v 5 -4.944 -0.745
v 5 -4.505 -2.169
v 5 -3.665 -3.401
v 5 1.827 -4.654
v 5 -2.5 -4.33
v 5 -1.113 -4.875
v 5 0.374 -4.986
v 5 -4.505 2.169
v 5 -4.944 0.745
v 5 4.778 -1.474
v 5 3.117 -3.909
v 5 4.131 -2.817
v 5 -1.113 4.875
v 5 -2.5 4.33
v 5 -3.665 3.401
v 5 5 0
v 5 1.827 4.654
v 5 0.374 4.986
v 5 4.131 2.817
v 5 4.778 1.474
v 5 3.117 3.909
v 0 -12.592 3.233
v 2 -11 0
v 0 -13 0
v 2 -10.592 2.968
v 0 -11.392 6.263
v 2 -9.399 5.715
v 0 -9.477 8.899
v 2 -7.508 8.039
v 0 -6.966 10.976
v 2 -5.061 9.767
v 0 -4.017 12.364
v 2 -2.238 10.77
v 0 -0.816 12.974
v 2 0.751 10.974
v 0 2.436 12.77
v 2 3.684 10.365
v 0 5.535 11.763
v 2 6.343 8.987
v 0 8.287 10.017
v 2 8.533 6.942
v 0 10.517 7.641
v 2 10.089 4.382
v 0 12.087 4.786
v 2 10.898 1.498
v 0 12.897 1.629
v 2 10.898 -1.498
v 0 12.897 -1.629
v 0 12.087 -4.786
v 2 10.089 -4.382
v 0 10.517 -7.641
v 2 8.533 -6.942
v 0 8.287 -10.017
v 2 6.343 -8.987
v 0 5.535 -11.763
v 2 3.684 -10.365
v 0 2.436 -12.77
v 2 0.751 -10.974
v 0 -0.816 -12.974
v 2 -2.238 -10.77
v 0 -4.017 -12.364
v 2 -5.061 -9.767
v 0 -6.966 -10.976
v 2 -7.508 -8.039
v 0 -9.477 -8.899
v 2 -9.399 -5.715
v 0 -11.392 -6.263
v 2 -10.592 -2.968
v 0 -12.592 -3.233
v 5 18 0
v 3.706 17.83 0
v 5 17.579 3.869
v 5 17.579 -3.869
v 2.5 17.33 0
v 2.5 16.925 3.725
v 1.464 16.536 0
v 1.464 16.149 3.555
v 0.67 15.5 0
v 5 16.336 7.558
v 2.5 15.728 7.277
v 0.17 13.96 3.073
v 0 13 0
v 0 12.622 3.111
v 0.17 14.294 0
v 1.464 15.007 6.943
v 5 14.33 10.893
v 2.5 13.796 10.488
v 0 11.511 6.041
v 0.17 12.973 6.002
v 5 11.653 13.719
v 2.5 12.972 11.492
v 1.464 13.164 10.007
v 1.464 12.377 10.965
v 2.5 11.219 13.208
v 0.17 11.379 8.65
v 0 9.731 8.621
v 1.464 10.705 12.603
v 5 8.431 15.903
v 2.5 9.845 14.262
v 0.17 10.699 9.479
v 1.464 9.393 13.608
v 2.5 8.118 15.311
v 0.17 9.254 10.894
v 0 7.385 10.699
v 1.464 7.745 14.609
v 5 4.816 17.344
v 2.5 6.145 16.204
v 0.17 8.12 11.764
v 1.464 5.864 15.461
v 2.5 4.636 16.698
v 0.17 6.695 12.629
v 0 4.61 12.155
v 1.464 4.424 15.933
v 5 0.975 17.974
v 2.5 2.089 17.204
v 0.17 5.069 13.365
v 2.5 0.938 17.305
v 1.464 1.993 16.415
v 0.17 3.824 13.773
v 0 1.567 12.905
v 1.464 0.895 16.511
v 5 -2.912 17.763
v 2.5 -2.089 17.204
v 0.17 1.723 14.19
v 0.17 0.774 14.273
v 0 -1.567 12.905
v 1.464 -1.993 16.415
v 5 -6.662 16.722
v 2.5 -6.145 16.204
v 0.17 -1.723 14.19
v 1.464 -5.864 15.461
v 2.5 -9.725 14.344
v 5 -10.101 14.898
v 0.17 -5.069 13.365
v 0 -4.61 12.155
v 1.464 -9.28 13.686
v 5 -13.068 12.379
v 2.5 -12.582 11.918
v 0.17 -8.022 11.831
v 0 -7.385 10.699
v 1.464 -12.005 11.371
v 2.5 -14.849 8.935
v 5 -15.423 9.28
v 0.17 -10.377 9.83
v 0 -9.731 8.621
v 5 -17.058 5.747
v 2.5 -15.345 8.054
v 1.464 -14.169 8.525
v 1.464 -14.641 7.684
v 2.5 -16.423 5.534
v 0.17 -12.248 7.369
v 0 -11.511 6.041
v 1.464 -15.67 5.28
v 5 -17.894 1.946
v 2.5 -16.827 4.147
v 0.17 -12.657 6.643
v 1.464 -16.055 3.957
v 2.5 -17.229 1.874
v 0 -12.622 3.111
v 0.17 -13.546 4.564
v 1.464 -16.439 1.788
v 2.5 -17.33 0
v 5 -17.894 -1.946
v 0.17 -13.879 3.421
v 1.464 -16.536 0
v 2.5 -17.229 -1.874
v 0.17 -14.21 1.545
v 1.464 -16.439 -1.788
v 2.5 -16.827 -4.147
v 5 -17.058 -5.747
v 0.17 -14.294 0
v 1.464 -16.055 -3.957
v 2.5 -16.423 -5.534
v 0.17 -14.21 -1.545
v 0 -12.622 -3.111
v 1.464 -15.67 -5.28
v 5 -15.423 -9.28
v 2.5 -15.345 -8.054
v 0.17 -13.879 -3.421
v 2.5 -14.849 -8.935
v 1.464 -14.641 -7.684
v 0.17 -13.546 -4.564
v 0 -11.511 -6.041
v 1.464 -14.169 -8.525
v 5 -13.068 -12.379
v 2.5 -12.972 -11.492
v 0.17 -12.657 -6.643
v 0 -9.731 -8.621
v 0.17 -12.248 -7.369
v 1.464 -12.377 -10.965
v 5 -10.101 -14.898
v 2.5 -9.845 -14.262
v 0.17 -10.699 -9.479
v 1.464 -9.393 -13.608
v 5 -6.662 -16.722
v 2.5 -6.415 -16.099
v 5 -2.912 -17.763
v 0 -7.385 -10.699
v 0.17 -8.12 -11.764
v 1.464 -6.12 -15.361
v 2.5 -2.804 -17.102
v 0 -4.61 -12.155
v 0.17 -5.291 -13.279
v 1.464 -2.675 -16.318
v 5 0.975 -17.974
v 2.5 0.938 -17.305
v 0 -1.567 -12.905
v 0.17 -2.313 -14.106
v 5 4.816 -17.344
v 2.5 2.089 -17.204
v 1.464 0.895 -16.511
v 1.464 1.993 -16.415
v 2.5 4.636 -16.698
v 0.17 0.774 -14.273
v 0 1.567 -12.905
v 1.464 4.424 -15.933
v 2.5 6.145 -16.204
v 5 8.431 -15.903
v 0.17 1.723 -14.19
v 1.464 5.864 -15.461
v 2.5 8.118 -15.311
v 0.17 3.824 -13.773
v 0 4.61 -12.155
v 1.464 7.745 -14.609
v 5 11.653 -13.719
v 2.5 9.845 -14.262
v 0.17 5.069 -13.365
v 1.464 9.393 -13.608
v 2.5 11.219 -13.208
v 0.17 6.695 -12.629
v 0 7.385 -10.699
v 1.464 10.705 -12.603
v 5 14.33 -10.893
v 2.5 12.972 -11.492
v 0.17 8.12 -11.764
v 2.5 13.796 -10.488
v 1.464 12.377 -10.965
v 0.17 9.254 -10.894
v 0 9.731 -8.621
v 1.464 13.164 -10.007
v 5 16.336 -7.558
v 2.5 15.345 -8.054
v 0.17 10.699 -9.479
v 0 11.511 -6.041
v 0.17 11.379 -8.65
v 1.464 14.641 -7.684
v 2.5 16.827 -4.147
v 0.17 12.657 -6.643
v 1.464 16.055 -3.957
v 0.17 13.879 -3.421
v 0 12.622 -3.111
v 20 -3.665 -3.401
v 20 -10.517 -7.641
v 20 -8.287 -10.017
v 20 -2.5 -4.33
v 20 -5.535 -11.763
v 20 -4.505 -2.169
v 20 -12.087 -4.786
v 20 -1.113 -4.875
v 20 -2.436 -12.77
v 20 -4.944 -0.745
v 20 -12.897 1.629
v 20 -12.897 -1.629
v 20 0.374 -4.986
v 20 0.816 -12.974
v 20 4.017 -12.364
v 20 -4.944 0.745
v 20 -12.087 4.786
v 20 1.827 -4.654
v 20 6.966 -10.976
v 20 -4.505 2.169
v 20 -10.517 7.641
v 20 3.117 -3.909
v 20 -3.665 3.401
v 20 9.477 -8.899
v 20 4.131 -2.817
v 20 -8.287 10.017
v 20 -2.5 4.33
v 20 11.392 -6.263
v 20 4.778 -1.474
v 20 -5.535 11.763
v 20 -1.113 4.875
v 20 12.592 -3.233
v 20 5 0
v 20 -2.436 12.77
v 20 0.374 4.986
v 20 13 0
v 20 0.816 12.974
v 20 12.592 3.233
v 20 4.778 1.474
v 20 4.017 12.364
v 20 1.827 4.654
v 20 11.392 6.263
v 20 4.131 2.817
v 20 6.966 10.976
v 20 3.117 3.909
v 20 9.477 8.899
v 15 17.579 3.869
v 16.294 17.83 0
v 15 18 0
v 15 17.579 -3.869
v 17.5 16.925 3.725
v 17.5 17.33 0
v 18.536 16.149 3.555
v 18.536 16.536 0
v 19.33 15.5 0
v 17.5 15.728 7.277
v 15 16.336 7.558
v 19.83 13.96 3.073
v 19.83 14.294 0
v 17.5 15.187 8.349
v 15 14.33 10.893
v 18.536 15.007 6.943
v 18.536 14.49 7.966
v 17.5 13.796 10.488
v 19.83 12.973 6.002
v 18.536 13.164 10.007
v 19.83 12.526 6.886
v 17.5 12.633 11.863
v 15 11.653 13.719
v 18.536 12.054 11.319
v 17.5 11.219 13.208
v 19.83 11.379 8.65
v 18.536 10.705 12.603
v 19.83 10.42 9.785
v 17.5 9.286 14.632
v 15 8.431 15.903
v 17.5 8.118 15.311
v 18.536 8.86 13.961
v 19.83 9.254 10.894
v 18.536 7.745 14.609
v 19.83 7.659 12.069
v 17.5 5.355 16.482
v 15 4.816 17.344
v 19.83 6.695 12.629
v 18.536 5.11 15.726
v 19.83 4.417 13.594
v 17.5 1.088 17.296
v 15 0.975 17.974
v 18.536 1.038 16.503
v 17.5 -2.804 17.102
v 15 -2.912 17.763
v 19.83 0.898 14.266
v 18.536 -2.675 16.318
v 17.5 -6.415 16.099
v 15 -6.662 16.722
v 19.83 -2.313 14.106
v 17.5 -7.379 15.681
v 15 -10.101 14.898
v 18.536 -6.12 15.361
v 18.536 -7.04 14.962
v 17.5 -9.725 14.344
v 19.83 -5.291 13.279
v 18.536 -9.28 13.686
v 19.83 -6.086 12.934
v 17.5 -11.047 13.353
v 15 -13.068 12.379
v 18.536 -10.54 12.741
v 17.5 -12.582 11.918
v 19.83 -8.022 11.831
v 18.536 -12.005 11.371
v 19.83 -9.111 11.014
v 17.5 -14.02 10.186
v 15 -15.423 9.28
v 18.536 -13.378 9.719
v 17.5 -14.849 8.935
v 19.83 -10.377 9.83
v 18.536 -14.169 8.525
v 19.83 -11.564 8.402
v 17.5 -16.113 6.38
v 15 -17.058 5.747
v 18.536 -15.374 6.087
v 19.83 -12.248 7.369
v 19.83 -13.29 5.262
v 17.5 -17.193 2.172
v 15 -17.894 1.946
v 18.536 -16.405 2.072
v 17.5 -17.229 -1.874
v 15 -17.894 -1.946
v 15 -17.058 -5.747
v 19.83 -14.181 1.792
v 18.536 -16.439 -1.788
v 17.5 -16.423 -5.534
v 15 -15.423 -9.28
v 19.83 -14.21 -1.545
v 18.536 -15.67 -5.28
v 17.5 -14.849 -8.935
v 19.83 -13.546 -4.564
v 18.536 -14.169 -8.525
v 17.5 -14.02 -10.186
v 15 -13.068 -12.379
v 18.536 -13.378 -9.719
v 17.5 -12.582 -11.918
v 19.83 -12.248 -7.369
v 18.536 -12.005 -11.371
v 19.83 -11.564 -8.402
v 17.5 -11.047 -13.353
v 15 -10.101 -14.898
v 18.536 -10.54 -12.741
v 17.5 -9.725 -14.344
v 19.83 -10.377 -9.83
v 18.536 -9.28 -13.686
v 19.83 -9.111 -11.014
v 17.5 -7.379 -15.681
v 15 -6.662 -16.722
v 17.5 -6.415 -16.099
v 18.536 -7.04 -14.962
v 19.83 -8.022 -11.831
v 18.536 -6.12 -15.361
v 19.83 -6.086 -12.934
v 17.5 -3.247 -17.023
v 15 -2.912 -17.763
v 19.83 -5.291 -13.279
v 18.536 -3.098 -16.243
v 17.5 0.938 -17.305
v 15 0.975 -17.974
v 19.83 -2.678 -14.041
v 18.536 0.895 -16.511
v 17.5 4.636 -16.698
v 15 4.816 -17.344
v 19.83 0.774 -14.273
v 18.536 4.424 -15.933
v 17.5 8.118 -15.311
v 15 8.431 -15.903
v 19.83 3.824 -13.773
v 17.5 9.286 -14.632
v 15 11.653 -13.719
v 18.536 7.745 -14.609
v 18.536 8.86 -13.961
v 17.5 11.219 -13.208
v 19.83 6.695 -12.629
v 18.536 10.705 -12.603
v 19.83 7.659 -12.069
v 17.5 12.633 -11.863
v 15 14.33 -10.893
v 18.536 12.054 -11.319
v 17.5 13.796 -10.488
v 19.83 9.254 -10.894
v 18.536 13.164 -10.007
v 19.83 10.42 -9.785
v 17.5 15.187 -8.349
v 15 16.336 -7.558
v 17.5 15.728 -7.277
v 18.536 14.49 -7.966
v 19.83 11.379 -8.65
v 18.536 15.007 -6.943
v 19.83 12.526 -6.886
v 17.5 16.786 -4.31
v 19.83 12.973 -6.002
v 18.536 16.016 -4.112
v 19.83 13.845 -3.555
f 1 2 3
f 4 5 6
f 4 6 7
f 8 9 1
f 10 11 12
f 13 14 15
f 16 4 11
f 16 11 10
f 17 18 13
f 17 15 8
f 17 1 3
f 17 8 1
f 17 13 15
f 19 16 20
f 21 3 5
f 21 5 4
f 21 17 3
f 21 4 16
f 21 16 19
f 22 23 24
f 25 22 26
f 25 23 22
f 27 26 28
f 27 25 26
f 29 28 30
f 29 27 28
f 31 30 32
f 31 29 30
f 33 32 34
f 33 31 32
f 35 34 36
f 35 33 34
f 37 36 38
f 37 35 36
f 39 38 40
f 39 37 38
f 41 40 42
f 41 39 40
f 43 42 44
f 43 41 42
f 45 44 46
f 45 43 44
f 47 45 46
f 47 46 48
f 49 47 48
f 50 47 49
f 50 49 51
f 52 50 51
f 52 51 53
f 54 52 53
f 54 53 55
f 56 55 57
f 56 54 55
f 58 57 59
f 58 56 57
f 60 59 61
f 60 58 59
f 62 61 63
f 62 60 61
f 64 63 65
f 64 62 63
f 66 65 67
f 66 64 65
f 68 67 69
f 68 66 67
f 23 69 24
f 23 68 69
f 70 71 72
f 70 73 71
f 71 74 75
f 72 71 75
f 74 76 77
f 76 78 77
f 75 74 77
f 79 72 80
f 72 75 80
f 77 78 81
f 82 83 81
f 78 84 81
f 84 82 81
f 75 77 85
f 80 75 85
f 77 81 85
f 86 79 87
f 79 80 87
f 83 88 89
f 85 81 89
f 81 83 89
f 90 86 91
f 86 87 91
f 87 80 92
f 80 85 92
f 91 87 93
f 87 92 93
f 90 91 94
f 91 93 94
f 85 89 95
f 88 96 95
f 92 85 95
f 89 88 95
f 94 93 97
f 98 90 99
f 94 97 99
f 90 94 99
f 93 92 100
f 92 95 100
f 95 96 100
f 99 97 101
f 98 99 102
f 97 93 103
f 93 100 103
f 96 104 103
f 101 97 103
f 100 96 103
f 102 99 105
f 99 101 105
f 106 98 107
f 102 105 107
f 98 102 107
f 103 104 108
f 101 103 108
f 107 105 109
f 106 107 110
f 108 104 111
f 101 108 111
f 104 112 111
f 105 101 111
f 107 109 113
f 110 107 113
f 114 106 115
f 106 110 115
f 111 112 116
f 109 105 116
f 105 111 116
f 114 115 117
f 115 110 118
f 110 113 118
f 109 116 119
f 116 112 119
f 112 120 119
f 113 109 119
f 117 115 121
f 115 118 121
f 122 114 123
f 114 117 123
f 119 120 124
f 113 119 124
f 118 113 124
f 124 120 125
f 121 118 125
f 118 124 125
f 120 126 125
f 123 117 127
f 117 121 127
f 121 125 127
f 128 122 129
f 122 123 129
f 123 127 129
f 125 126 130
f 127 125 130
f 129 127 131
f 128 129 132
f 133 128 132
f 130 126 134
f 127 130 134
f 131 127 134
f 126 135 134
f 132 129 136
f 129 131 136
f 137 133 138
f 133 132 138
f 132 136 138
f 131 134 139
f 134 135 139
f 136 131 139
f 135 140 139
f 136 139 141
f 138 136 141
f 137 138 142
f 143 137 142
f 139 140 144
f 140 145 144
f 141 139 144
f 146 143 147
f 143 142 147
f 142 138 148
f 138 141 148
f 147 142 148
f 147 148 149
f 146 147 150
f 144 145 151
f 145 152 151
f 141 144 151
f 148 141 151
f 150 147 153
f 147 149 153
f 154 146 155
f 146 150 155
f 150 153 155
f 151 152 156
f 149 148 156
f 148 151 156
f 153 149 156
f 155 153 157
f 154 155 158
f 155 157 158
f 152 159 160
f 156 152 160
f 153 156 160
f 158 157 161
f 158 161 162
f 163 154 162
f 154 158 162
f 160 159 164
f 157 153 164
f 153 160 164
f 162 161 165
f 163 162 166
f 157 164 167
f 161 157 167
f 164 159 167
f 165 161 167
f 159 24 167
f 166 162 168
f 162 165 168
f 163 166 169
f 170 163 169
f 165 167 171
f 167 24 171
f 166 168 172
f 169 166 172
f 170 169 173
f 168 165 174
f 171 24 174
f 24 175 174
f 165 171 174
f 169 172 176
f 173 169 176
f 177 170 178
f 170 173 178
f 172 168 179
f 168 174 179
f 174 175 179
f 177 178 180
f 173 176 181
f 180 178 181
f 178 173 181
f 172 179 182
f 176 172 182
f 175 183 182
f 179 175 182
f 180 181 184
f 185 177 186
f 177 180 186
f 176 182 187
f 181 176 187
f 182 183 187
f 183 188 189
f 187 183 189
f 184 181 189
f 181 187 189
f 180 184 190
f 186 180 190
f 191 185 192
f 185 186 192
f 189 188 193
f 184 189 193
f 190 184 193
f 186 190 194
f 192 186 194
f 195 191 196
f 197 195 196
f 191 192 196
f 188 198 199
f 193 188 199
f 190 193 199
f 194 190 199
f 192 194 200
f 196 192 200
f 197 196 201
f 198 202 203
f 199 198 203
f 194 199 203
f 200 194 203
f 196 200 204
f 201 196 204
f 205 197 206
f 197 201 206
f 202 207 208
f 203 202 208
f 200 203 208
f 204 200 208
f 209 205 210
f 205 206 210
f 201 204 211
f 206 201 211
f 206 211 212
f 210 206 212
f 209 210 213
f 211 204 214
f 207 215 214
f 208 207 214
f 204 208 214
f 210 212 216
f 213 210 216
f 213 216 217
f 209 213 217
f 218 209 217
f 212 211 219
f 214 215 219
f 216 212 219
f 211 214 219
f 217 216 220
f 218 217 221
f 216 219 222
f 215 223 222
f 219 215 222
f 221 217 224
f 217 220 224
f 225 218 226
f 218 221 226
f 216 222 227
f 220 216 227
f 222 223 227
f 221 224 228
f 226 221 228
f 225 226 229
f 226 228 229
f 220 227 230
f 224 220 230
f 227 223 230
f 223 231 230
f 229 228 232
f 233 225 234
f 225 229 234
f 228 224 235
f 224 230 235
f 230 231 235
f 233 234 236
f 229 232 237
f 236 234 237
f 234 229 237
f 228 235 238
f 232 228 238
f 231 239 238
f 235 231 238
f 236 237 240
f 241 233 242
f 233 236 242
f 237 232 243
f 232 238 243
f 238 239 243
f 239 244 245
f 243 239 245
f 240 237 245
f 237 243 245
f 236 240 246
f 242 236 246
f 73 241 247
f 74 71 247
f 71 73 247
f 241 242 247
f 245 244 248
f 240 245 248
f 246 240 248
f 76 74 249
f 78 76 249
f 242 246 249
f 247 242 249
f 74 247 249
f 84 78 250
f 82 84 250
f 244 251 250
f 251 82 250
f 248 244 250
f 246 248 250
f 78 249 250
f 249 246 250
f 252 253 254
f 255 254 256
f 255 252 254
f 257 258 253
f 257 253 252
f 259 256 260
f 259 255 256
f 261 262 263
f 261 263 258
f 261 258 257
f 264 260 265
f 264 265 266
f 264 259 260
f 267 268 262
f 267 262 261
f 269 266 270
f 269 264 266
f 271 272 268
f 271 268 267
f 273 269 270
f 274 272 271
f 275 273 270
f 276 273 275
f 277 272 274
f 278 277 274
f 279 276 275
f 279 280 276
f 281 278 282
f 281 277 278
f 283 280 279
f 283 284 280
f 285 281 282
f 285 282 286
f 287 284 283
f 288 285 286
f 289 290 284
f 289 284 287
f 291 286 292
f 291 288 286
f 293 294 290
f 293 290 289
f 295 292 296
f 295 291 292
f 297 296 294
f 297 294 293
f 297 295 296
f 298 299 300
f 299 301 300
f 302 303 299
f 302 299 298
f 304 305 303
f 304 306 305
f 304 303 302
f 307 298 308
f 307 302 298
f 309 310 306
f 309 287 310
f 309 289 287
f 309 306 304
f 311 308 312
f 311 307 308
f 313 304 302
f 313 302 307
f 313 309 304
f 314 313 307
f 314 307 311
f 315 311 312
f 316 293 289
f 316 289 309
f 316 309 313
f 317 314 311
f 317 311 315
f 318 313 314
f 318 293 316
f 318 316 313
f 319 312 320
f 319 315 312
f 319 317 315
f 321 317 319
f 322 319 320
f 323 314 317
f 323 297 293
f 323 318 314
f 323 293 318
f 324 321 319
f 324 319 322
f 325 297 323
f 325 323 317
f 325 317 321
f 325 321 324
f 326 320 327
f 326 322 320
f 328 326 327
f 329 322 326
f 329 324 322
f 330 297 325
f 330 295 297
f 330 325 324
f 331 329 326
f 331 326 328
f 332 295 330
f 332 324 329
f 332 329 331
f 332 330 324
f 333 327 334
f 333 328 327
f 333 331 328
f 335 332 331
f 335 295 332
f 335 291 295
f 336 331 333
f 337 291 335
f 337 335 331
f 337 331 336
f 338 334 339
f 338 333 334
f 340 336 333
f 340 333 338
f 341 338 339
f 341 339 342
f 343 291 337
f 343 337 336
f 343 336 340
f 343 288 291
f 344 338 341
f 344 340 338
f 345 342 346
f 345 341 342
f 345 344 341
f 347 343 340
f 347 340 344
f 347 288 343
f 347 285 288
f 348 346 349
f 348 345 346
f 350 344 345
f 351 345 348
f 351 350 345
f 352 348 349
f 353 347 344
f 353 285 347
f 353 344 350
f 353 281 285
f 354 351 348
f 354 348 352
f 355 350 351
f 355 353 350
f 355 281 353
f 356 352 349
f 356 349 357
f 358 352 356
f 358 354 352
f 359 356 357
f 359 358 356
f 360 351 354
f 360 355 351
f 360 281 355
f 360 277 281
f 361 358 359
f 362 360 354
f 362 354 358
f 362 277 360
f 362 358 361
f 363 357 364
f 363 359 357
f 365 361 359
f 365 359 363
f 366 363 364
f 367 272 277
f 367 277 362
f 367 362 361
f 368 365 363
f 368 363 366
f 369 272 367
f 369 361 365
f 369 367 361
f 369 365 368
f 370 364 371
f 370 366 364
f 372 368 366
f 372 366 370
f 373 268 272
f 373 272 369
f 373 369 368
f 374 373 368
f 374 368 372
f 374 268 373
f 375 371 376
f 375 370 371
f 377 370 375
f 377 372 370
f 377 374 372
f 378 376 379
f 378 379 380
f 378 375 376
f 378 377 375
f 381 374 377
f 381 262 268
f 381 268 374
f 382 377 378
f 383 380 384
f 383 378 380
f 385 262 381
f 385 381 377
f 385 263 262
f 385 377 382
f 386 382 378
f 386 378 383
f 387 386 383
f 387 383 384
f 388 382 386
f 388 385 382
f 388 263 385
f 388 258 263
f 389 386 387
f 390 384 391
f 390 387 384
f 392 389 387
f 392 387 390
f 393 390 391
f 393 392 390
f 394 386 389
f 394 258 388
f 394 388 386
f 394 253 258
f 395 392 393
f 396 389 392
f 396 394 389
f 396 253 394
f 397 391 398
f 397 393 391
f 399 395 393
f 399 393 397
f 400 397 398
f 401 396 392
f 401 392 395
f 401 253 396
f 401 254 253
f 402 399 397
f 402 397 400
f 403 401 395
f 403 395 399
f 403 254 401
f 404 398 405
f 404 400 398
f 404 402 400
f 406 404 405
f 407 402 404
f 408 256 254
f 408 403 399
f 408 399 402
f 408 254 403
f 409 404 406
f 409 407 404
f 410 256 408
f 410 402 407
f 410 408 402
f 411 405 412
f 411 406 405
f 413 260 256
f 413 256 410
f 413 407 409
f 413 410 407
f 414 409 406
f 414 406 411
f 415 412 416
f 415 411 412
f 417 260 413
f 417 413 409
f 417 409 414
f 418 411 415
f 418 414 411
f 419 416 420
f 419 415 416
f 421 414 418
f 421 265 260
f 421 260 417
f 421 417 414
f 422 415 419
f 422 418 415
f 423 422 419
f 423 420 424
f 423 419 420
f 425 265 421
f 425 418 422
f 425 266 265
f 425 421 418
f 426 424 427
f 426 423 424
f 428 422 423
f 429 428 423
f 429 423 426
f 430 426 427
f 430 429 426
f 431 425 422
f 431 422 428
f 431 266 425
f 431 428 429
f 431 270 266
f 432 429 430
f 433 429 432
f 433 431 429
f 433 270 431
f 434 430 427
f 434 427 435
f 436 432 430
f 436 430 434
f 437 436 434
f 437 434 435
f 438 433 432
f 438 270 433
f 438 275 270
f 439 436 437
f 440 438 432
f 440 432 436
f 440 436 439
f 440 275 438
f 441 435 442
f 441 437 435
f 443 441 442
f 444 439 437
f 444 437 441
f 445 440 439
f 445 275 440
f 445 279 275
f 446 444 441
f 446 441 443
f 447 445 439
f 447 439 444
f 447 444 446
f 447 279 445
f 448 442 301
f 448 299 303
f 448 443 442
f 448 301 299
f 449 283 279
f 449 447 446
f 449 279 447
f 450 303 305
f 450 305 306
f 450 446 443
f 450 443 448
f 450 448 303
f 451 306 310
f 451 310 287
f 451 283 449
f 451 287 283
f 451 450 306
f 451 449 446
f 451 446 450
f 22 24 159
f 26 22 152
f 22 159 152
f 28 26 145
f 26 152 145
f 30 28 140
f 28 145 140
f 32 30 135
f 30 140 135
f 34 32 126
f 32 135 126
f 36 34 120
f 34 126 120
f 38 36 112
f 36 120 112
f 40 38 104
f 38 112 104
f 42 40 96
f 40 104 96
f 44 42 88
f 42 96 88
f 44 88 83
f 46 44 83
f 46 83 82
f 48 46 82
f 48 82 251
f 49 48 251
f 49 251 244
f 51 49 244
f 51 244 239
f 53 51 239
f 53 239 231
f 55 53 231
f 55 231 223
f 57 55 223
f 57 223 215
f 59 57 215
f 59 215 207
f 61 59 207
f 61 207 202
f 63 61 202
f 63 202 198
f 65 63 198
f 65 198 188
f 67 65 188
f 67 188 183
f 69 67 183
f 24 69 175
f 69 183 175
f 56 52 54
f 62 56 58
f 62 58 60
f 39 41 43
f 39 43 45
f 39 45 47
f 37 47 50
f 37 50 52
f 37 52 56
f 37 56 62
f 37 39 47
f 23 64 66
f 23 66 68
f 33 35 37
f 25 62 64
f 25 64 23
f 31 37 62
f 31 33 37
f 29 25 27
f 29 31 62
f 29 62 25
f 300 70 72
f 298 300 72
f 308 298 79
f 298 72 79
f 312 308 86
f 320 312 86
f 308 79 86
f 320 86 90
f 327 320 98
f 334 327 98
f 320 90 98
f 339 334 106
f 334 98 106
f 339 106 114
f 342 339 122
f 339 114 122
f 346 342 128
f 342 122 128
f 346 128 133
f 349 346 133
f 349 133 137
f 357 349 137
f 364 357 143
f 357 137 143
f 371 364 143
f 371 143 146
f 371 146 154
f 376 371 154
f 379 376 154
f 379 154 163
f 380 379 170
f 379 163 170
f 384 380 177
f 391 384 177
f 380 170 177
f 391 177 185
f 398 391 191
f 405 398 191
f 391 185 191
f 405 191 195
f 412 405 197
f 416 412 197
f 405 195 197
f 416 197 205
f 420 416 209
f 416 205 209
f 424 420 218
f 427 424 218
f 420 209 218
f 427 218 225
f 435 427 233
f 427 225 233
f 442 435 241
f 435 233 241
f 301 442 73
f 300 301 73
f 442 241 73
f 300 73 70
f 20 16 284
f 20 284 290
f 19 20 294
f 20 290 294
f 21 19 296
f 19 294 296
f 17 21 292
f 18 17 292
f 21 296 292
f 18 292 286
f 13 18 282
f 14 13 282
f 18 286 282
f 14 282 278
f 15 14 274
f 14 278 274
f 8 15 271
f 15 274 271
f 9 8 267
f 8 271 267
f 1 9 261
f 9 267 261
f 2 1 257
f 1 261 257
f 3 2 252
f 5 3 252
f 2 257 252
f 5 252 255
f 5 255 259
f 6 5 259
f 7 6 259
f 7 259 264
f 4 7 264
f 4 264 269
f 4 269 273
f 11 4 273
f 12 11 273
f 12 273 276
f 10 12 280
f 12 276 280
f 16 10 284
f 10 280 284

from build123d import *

# Parameters (mm, degrees)
F0_R     = 18
F1_DEPTH = 20
F2_R     = 5
F3_DEPTH = 15
F4_R     = 5
F5_R     = 13
F6_DEPTH = 2
F7_SIZE  = 1.99999


# Not quite as in the source:
# - a fillet or chamfer is up to 0.001 mm smaller than in the source, because OpenCascade refuses the exact size


with BuildPart() as f1:
    # F0 (on Right) → F1 (new body)
    with BuildSketch(Plane.YZ):
        Circle(F0_R)
    extrude(amount=F1_DEPTH)

    # F2 (on face) → F3 (cut)
    with BuildSketch(Plane.YZ.offset(20)):
        Circle(F2_R)
    extrude(amount=-F3_DEPTH, mode=Mode.SUBTRACT)

    # F4
    f4_edges = [f1.edges().sort_by_distance(p)[0] for p in [
        (0, -18, 0),
        (20, -18, 0),
    ]]
    fillet(f4_edges, radius=F4_R)

    # F5 (on face) → F6 (cut)
    with BuildSketch(Plane(origin=(0, 0, 0), x_dir=(0, -1, 0), z_dir=(-1, 0, 0))):
        Circle(F5_R)
    extrude(amount=-F6_DEPTH, mode=Mode.SUBTRACT)

    # F7 (size 2 in the source; OpenCascade refuses exactly that, so slightly less here)
    f7_edges = [f1.edges().sort_by_distance(p)[0] for p in [
        (2, 13, 0),
    ]]
    chamfer(f7_edges, length=F7_SIZE)


solid = f1.part
